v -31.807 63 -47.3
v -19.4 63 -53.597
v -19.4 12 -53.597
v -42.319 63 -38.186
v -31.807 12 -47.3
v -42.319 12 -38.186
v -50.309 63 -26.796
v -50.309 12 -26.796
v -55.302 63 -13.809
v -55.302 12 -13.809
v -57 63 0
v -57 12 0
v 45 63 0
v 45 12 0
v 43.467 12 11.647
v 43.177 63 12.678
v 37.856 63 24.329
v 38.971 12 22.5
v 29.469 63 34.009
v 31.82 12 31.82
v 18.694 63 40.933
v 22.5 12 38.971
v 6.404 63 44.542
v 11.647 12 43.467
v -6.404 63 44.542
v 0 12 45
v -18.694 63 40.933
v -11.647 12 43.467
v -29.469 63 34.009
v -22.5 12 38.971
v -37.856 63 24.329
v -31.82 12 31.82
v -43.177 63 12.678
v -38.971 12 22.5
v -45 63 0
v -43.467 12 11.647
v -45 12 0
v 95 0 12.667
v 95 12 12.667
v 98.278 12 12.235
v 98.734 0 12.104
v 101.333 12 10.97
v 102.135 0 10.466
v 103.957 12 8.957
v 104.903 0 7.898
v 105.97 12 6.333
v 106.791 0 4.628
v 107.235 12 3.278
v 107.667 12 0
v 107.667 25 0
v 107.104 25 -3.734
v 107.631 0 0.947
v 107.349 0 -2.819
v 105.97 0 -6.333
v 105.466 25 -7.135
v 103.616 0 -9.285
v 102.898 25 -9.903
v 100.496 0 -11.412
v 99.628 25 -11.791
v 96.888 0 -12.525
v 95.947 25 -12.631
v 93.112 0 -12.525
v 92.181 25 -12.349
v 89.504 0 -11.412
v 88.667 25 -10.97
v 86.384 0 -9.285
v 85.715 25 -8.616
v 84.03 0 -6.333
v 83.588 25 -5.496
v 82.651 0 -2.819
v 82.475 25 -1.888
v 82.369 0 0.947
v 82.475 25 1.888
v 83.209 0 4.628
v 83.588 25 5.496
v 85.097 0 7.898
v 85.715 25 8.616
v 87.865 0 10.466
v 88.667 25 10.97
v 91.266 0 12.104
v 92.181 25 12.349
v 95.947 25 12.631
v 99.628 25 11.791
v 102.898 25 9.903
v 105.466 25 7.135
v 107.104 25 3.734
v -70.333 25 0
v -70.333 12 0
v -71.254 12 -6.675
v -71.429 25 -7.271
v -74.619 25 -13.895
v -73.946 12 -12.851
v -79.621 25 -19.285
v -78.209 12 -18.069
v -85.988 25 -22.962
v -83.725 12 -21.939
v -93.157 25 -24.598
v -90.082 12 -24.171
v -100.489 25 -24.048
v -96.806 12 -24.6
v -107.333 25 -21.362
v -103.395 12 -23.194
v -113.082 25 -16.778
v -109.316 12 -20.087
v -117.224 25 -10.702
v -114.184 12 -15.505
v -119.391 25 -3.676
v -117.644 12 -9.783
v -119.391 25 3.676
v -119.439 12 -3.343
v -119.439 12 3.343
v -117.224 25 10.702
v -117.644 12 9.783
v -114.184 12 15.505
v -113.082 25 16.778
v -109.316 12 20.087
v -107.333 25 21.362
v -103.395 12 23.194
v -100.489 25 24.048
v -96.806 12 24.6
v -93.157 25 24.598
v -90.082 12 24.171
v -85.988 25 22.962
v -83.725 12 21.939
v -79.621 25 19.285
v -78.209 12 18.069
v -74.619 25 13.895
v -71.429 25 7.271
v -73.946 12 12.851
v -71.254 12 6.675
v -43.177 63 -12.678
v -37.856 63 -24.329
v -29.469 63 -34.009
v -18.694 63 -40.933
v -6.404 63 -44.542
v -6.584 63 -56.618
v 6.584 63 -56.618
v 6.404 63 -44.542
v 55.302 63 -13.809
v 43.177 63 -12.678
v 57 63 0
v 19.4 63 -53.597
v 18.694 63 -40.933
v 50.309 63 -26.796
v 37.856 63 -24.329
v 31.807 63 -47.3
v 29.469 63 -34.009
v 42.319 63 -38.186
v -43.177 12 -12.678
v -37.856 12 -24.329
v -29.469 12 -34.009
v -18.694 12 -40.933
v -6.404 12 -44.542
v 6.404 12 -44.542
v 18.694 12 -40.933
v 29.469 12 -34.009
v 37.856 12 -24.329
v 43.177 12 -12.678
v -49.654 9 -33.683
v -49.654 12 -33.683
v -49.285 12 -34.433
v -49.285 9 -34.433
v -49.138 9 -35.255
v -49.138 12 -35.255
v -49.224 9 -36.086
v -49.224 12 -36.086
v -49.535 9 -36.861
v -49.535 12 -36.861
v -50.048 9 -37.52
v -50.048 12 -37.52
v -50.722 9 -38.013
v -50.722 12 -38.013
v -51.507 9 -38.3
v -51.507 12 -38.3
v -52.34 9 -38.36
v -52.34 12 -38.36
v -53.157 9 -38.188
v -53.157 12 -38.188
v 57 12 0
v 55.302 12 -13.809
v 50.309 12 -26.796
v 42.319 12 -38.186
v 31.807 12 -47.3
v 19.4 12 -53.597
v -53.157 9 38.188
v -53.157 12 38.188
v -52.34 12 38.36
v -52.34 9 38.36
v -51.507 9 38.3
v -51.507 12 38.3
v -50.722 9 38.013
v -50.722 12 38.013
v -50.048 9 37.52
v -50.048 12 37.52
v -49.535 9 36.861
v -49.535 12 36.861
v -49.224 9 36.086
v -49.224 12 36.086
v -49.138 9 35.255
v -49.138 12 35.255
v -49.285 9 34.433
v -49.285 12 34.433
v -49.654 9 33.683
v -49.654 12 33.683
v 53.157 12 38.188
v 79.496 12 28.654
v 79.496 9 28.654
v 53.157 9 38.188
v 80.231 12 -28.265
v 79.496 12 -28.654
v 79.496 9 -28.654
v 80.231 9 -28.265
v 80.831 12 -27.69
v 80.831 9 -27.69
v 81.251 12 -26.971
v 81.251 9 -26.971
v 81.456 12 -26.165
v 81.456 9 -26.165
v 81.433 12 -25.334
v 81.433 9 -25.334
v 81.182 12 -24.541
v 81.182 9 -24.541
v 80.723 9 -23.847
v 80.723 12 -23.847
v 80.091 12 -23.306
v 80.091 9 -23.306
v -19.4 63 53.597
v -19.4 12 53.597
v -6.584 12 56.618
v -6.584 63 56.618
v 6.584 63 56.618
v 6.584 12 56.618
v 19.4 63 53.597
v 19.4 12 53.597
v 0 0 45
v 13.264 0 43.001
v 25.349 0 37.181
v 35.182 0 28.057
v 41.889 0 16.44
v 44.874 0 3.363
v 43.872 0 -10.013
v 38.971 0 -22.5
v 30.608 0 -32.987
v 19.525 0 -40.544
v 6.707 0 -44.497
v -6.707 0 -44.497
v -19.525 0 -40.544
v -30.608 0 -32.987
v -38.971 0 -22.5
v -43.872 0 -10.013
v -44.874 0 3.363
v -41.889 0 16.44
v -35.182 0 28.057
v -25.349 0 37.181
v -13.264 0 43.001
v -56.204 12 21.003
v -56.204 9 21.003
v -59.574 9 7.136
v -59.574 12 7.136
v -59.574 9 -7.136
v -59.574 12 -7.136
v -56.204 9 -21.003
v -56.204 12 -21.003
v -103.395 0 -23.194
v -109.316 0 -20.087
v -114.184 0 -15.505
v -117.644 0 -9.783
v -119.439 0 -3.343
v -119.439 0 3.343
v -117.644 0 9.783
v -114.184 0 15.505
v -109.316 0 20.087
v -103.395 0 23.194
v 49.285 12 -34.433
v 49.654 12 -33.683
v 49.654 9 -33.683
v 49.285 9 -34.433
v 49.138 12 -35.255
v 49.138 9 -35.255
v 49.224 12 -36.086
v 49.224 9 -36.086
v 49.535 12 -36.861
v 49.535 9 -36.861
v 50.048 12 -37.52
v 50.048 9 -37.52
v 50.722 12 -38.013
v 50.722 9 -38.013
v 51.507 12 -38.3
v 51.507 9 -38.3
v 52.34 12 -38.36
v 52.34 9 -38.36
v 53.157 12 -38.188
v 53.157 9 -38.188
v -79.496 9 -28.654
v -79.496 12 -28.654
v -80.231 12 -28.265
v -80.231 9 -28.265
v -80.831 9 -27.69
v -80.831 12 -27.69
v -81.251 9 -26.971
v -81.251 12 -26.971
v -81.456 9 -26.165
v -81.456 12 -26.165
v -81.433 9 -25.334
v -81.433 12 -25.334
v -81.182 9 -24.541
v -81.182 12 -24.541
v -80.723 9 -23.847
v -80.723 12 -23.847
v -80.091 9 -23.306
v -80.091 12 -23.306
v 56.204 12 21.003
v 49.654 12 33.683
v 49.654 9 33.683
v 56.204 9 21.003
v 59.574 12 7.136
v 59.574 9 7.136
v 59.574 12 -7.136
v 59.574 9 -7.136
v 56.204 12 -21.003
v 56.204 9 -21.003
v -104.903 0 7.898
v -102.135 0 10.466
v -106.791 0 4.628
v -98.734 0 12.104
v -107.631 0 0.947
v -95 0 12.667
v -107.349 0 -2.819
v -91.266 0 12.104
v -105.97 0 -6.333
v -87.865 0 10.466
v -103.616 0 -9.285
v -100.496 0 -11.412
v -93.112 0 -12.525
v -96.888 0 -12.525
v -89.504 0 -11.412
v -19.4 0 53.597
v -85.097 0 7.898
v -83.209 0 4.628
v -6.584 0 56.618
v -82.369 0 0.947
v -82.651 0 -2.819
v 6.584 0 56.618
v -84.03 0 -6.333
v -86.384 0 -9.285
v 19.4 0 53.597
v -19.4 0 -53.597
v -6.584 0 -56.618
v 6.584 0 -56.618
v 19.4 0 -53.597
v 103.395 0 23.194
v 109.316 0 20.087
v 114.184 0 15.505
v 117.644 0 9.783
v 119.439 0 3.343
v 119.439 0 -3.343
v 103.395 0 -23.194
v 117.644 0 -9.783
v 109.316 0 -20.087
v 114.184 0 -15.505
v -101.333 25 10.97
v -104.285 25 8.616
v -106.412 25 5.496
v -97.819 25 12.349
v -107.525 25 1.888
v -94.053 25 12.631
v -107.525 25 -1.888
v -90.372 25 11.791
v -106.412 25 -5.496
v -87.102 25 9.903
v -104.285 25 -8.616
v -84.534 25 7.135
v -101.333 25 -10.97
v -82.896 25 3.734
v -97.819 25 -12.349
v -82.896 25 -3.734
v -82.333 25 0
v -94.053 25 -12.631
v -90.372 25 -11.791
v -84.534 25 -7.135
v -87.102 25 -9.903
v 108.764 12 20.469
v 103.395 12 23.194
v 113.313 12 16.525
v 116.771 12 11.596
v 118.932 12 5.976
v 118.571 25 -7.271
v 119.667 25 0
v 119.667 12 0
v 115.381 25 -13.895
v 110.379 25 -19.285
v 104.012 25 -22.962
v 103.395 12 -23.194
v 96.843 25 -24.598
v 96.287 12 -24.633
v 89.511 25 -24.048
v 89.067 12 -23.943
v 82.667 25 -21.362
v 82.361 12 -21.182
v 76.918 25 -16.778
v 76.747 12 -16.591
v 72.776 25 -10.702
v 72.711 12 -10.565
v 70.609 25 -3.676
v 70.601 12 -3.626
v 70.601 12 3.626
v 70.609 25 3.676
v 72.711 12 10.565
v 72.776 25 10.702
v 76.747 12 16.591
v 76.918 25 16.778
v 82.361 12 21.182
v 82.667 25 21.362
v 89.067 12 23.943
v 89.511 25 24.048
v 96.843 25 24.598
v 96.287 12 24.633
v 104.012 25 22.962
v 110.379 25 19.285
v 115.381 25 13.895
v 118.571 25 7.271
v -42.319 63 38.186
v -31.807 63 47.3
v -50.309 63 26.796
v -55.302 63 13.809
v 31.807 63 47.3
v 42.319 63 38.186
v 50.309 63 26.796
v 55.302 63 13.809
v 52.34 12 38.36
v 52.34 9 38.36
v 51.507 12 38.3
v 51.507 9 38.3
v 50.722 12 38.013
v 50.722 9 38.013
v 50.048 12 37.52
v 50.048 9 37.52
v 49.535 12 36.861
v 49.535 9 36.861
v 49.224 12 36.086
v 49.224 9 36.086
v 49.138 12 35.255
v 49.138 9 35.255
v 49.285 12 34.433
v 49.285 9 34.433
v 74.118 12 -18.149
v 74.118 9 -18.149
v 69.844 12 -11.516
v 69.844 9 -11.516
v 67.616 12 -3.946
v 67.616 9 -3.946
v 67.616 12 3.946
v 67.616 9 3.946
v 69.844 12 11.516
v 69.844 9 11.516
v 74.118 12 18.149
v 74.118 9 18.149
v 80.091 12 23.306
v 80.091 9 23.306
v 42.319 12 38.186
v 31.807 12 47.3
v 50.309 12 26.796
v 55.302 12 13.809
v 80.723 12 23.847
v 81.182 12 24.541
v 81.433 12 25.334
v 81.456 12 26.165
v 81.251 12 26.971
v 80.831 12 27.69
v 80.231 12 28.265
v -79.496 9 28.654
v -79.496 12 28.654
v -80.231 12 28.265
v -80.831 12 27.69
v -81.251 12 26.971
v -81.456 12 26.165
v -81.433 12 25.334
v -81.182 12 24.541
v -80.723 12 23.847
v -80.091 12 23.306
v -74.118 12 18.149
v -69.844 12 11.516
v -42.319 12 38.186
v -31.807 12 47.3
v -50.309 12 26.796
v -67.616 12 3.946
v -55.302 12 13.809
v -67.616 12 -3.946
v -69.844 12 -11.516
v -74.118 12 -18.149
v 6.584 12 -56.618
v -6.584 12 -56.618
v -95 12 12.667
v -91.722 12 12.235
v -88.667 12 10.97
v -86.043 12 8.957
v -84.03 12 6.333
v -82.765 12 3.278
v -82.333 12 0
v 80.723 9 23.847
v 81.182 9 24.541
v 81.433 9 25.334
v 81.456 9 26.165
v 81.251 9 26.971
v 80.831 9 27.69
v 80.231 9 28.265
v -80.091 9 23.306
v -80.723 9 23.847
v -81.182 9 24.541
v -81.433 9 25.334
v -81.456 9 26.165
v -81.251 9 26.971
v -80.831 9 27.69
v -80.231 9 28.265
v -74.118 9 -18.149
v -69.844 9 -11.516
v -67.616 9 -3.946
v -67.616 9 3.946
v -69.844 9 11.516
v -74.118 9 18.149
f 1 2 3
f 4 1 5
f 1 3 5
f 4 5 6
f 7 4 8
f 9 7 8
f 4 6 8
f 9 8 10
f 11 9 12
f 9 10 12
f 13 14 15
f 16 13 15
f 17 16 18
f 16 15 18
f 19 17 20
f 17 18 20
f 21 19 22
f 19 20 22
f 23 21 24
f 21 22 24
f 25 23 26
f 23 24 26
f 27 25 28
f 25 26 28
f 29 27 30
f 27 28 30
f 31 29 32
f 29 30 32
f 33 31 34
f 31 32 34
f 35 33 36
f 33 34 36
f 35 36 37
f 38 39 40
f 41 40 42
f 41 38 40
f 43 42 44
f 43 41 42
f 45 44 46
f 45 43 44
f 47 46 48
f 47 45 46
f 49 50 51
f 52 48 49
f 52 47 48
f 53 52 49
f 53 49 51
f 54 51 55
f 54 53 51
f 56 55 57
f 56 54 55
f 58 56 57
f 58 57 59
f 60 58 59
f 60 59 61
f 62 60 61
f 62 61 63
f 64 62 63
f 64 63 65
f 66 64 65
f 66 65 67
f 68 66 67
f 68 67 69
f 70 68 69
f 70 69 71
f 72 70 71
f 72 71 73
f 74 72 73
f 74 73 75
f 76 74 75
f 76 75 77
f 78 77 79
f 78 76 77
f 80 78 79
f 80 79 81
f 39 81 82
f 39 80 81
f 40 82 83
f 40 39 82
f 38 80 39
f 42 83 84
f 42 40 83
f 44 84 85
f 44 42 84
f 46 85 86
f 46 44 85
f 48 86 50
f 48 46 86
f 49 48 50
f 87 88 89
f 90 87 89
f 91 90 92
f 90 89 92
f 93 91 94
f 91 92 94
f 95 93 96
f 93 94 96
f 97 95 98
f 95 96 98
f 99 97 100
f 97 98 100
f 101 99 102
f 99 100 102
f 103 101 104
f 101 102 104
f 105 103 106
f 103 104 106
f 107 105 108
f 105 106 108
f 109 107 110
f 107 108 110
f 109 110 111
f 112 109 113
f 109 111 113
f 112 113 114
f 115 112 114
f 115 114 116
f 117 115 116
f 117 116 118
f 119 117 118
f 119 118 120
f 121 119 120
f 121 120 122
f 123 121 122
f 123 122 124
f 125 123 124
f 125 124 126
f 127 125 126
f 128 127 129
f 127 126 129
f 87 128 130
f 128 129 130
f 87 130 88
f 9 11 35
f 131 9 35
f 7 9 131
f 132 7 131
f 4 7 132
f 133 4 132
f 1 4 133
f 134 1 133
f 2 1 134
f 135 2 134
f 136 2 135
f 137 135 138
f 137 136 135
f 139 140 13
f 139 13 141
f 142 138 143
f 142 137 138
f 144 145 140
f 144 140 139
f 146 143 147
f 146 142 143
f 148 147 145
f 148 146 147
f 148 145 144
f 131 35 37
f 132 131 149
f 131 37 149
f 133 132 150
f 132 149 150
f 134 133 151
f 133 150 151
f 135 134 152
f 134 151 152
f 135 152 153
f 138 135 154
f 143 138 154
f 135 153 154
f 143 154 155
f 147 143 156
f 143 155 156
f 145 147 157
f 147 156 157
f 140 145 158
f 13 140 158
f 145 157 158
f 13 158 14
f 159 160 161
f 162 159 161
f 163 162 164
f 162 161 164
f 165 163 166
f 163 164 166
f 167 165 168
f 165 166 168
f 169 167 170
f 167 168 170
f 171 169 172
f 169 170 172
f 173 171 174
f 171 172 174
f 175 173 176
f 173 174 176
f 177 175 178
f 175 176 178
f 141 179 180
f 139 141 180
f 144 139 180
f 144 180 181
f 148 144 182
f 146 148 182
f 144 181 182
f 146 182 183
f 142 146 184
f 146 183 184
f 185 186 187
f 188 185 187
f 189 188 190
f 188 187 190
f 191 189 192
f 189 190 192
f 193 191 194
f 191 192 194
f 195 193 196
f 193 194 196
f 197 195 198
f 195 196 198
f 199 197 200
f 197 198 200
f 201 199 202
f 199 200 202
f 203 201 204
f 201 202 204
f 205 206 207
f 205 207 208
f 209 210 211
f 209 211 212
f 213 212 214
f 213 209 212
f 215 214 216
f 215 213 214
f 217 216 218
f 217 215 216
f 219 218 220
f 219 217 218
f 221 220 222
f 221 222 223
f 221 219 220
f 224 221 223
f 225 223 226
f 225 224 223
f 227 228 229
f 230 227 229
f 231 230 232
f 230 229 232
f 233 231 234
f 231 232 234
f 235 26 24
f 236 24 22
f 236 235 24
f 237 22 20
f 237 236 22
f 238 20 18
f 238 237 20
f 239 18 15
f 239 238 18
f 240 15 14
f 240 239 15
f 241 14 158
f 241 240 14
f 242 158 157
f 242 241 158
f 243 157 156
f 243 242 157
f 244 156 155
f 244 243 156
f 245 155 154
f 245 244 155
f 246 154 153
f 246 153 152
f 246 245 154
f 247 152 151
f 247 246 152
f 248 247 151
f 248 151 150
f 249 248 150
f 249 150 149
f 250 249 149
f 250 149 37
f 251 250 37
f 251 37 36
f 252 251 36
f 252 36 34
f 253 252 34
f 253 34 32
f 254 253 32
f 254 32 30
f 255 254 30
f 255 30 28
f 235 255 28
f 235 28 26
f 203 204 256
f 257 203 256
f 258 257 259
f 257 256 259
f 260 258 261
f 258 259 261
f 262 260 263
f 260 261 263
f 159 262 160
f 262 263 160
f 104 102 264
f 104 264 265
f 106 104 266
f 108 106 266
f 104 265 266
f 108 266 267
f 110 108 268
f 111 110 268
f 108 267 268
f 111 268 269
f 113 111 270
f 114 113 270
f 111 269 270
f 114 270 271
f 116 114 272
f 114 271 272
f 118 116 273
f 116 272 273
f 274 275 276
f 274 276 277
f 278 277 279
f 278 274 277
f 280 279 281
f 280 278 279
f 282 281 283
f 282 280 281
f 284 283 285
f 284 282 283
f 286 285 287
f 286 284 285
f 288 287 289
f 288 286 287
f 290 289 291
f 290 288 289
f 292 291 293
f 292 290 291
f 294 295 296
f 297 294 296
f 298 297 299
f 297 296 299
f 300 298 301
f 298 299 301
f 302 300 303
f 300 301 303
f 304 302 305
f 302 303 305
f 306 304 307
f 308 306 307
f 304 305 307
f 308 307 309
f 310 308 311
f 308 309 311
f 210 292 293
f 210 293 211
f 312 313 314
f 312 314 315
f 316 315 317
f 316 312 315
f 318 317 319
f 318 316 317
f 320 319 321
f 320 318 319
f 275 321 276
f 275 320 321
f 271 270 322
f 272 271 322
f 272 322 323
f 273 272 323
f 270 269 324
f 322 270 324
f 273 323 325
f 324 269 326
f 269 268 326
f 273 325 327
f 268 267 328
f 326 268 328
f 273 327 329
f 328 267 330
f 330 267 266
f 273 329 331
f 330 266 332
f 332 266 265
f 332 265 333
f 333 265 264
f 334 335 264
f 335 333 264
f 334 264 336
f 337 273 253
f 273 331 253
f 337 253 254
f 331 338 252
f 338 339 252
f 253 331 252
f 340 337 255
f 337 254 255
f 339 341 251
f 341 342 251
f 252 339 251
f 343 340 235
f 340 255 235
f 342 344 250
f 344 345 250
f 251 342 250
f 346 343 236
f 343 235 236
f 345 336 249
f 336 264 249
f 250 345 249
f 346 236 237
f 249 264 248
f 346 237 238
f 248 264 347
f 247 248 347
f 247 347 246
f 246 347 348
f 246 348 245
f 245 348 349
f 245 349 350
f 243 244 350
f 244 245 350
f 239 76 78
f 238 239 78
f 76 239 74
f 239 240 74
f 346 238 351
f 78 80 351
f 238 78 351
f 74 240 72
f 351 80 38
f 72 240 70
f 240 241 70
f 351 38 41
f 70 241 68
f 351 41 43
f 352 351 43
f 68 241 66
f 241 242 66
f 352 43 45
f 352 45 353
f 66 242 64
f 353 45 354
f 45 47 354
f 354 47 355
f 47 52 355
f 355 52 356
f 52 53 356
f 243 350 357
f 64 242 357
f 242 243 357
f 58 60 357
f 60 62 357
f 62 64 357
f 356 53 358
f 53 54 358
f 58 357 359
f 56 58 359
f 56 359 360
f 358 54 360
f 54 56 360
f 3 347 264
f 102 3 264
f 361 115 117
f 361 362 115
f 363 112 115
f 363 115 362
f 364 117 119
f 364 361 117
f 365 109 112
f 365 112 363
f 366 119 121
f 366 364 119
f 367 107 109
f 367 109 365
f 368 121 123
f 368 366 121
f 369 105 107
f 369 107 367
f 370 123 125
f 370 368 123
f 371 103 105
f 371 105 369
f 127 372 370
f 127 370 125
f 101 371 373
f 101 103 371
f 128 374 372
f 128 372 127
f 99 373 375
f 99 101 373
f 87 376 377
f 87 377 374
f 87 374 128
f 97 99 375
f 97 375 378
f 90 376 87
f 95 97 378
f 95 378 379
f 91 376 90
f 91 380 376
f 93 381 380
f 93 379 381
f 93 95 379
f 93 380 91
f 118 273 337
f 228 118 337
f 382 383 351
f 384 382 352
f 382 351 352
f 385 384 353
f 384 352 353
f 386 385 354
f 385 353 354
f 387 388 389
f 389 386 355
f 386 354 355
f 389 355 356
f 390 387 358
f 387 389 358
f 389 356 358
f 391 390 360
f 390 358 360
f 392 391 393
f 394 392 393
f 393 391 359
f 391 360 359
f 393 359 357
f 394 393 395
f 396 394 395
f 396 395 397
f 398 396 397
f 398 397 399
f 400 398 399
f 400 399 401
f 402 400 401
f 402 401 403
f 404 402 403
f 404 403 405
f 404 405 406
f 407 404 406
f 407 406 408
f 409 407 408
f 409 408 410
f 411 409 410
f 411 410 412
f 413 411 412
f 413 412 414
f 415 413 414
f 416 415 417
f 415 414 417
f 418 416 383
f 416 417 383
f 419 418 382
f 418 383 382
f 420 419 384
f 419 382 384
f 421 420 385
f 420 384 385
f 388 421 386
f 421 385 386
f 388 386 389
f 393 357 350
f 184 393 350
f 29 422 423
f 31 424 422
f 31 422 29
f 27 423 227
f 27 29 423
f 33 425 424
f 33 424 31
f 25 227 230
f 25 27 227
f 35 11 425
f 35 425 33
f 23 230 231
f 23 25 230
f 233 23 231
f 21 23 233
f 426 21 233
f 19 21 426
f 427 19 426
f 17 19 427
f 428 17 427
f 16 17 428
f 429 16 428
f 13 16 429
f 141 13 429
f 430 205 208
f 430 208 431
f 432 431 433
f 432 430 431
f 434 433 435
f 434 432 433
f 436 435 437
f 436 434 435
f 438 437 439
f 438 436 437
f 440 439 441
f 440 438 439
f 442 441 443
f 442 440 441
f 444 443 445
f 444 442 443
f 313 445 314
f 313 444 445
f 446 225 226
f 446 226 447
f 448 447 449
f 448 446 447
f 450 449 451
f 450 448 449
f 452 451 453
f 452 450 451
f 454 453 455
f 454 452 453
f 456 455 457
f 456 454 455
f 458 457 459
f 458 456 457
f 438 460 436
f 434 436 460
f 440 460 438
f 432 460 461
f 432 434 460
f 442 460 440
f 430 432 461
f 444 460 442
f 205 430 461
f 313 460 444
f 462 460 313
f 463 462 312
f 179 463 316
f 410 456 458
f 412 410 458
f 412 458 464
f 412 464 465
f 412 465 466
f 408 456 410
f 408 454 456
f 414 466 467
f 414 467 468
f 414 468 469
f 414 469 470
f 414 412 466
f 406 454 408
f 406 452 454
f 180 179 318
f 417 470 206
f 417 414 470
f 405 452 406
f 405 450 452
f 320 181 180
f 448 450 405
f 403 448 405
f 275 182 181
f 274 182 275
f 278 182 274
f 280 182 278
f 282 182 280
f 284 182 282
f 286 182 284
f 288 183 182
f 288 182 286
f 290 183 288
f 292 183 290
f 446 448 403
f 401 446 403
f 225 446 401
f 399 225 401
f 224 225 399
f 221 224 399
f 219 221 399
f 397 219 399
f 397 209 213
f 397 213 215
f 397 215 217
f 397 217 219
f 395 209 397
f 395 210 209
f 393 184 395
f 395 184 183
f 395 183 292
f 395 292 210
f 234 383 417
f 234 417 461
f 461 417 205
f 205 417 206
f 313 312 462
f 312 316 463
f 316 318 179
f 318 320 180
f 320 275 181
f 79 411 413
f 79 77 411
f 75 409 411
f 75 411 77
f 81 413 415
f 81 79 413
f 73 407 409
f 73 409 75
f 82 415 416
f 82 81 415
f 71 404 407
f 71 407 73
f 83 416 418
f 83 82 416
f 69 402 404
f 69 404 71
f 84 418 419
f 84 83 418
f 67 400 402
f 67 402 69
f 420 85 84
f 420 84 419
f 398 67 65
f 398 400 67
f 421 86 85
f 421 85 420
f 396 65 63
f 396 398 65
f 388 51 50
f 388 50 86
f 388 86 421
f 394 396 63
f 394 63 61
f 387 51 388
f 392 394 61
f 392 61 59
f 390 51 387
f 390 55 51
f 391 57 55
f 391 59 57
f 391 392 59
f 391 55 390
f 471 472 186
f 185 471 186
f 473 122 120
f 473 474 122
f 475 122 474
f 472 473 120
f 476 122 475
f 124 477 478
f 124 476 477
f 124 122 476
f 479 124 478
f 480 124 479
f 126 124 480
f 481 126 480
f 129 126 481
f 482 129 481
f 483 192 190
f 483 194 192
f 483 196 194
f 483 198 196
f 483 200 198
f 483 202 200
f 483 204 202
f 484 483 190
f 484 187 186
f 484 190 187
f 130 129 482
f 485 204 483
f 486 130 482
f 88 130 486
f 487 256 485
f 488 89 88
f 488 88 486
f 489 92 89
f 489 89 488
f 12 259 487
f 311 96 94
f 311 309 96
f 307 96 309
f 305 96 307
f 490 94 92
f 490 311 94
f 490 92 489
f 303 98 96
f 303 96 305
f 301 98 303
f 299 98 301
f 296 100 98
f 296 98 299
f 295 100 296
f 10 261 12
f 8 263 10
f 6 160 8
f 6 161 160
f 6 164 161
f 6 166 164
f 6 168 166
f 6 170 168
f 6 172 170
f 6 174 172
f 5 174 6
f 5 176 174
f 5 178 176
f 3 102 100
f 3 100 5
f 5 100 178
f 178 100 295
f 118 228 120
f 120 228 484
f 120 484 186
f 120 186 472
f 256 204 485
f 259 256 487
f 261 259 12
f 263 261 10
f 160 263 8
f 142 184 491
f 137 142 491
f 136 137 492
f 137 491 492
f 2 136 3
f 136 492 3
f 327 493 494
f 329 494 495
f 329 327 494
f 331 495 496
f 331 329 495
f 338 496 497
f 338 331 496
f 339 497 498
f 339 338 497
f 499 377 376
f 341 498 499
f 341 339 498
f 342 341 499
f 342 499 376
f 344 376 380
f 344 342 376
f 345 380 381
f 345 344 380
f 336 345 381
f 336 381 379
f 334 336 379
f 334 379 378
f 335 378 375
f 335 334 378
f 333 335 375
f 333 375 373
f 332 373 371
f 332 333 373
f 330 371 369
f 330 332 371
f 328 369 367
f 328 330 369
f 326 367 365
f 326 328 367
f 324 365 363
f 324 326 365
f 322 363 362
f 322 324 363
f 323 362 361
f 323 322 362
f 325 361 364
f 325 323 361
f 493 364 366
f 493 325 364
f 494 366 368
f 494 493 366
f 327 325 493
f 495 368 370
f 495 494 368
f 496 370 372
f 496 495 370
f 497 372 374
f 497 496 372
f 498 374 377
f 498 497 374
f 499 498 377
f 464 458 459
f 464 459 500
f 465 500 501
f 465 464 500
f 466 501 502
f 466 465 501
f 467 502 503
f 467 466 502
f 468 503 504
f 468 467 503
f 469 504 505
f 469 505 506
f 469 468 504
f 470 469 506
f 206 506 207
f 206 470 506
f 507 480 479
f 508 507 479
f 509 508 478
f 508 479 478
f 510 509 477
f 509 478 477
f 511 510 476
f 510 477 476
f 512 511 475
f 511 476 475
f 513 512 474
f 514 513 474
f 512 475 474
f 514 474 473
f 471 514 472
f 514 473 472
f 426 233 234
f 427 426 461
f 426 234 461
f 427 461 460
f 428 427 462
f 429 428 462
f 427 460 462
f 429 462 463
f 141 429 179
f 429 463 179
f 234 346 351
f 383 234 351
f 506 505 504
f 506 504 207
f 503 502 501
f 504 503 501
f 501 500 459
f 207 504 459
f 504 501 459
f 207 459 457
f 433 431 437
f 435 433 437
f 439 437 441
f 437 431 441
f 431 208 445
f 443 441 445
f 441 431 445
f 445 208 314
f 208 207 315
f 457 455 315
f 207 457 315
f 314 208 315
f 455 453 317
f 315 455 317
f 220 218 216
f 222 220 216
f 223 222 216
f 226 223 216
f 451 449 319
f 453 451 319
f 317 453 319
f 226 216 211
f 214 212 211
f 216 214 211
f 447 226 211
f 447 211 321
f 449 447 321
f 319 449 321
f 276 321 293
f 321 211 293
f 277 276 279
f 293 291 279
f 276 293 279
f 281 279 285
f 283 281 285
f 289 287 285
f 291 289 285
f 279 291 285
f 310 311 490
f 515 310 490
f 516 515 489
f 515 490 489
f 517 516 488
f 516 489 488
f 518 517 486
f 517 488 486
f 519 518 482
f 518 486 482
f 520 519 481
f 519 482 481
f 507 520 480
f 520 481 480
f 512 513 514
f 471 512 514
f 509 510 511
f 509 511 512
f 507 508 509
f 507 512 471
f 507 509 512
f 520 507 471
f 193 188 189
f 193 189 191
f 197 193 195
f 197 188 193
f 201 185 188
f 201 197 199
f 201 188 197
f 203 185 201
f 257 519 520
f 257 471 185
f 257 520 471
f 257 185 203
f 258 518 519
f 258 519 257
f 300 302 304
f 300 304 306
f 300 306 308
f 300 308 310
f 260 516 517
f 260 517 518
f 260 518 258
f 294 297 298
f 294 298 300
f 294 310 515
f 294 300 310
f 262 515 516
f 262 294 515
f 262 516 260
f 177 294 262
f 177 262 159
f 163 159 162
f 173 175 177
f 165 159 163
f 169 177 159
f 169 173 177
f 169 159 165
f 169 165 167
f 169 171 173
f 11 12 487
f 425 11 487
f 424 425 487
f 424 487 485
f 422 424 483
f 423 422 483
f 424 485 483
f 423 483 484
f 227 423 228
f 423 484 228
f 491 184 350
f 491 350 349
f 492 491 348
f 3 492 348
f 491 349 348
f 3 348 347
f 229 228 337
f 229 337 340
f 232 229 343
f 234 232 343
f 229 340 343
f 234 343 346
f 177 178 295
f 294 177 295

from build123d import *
from build123d.topology import SkipClean

# Parameters (mm, degrees)
SKETCH3_R                 = 12.666666667
SKETCH3_R_2               = 45
BOSS_EXTRUDE1_DEPTH       = 12
BOSS_EXTRUDE2_START       = 12
BOSS_EXTRUDE2_OUTLINE_R   = 24.666666667
BOSS_EXTRUDE2_OUTLINE_R_2 = 12.666666667
BOSS_EXTRUDE2_DEPTH       = 13
BOSS_EXTRUDE3_START       = 12
BOSS_EXTRUDE3_DEPTH       = 51
CUT_EXTRUDE1_DEPTH        = 3


# Read off the part's stored shape, not the designer's step: Boss-Extrude2
with BuildPart() as part:
    # Sketch3 → Boss-Extrude1 (new body)
    with BuildSketch(Plane(origin=(0, 0, 0), x_dir=(1, 0, 0), z_dir=(0, 1, 0))):
        with BuildLine():
            ThreePointArc((-103.395321637, 23.194029815), (-119.666666667, 0), (-103.395321637, -23.194029815))
            Line((-103.395321637, -23.194029815), (-19.4, -53.597014842))
            ThreePointArc((-19.4, -53.597014842), (0, -57), (19.4, -53.597014842))
            Line((19.4, -53.597014842), (103.395321637, -23.194029815))
            ThreePointArc((103.395321637, -23.194029815), (119.666666667, 0), (103.395321637, 23.194029815))
            Line((103.395321637, 23.194029815), (19.4, 53.597014842))
            ThreePointArc((19.4, 53.597014842), (0, 57), (-19.4, 53.597014842))
            Line((-19.4, 53.597014842), (-103.395321637, 23.194029815))
        make_face()
        with Locations(Location((-95, 0, 0), (0, 0, 270))):
            Circle(SKETCH3_R, mode=Mode.SUBTRACT)
        with Locations(Location((0, 0, 0), (0, 0, 270))):
            Circle(SKETCH3_R_2, mode=Mode.SUBTRACT)
        with Locations(Location((95, 0, 0), (0, 0, 270))):
            Circle(SKETCH3_R, mode=Mode.SUBTRACT)
    extrude(amount=BOSS_EXTRUDE1_DEPTH)

    # Boss-Extrude2 outline → Boss-Extrude2 (add)
    # profile 1 of 2: a face of its own
    with BuildSketch(Plane(origin=(0, 0, 0), x_dir=(1, 0, 0), z_dir=(0, 1, 0)).offset(BOSS_EXTRUDE2_START)):
        with Locations((-95, 0)):
            Circle(BOSS_EXTRUDE2_OUTLINE_R)
        with Locations((-95, 0)):
            Circle(BOSS_EXTRUDE2_OUTLINE_R_2, mode=Mode.SUBTRACT)
    # profile 2 of 2: a face of its own
    with BuildSketch(Plane(origin=(0, 0, 0), x_dir=(1, 0, 0), z_dir=(0, 1, 0)).offset(BOSS_EXTRUDE2_START)):
        with Locations((95, 0)):
            Circle(BOSS_EXTRUDE2_OUTLINE_R)
        with Locations((95, 0)):
            Circle(BOSS_EXTRUDE2_OUTLINE_R_2, mode=Mode.SUBTRACT)
    extrude(amount=BOSS_EXTRUDE2_DEPTH)

    # Sketch3<7> → Boss-Extrude3 (add)
    with SkipClean():  # the faces are left unmerged after this step: merging them gives an invalid solid
        with BuildSketch(Plane(origin=(0, 0, 0), x_dir=(1, 0, 0), z_dir=(0, 1, 0)).offset(BOSS_EXTRUDE3_START)):
            with BuildLine():
                ThreePointArc((-19.4, 53.597014842), (-46.662618872, 32.735302045), (-57, 0))
                Line((-57, 0), (-45, 0))
                ThreePointArc((-45, 0), (0, 45), (45, 0))
                Line((45, 0), (57, 0))
                ThreePointArc((57, 0), (46.662618872, 32.735302045), (19.4, 53.597014842))
                ThreePointArc((19.4, 53.597014842), (0, 57), (-19.4, 53.597014842))
            make_face()
            with BuildLine():
                Line((-45, 0), (-57, 0))
                ThreePointArc((-57, 0), (-46.662618872, -32.735302045), (-19.4, -53.597014842))
                ThreePointArc((-19.4, -53.597014842), (0, -57), (19.4, -53.597014842))
                ThreePointArc((19.4, -53.597014842), (46.662618872, -32.735302045), (57, 0))
                Line((57, 0), (45, 0))
                ThreePointArc((45, 0), (0, -45), (-45, 0))
            make_face()
        extrude(amount=BOSS_EXTRUDE3_DEPTH)

    # Sketch7 → Cut-Extrude1 (cut)
    with SkipClean():  # the faces are left unmerged after this step: merging them gives an invalid solid
        with BuildSketch(Plane(origin=(0, 12, 0), x_dir=(1, 0, 0), z_dir=(0, 1, 0))):
            with BuildLine():
                Line((79.495818927, -28.654228549), (53.157283033, -38.187737044))
                ThreePointArc((53.157283033, -38.187737044), (49.768127235, -37.208603561), (49.653552763, -33.682706216))
                ThreePointArc((49.653552763, -33.682706216), (60, 0), (49.653552763, 33.682706216))
                ThreePointArc((49.653552763, 33.682706216), (49.768127235, 37.208603561), (53.157283033, 38.187737044))
                Line((53.157283033, 38.187737044), (79.495818927, 28.654228549))
                ThreePointArc((79.495818927, 28.654228549), (81.456336863, 26.165352539), (80.091365245, 23.306159147))
                ThreePointArc((80.091365245, 23.306159147), (67.333333333, 0), (80.091365245, -23.306159147))
                ThreePointArc((80.091365245, -23.306159147), (81.456336863, -26.165352539), (79.495818927, -28.654228549))
            make_face()
            with BuildLine():
                Line((-53.157283033, 38.187737044), (-79.495818927, 28.654228549))
                ThreePointArc((-79.495818927, 28.654228549), (-81.456336863, 26.165352539), (-80.091365245, 23.306159147))
                ThreePointArc((-80.091365245, 23.306159147), (-67.333333333, 0), (-80.091365245, -23.306159147))
                ThreePointArc((-80.091365245, -23.306159147), (-81.456336863, -26.165352539), (-79.495818927, -28.654228549))
                Line((-79.495818927, -28.654228549), (-53.157283033, -38.187737044))
                ThreePointArc((-53.157283033, -38.187737044), (-49.768127235, -37.208603561), (-49.653552763, -33.682706216))
                ThreePointArc((-49.653552763, -33.682706216), (-60, 0), (-49.653552763, 33.682706216))
                ThreePointArc((-49.653552763, 33.682706216), (-49.768127235, 37.208603561), (-53.157283033, 38.187737044))
            make_face()
        extrude(amount=-CUT_EXTRUDE1_DEPTH, mode=Mode.SUBTRACT)


solid = part.part
